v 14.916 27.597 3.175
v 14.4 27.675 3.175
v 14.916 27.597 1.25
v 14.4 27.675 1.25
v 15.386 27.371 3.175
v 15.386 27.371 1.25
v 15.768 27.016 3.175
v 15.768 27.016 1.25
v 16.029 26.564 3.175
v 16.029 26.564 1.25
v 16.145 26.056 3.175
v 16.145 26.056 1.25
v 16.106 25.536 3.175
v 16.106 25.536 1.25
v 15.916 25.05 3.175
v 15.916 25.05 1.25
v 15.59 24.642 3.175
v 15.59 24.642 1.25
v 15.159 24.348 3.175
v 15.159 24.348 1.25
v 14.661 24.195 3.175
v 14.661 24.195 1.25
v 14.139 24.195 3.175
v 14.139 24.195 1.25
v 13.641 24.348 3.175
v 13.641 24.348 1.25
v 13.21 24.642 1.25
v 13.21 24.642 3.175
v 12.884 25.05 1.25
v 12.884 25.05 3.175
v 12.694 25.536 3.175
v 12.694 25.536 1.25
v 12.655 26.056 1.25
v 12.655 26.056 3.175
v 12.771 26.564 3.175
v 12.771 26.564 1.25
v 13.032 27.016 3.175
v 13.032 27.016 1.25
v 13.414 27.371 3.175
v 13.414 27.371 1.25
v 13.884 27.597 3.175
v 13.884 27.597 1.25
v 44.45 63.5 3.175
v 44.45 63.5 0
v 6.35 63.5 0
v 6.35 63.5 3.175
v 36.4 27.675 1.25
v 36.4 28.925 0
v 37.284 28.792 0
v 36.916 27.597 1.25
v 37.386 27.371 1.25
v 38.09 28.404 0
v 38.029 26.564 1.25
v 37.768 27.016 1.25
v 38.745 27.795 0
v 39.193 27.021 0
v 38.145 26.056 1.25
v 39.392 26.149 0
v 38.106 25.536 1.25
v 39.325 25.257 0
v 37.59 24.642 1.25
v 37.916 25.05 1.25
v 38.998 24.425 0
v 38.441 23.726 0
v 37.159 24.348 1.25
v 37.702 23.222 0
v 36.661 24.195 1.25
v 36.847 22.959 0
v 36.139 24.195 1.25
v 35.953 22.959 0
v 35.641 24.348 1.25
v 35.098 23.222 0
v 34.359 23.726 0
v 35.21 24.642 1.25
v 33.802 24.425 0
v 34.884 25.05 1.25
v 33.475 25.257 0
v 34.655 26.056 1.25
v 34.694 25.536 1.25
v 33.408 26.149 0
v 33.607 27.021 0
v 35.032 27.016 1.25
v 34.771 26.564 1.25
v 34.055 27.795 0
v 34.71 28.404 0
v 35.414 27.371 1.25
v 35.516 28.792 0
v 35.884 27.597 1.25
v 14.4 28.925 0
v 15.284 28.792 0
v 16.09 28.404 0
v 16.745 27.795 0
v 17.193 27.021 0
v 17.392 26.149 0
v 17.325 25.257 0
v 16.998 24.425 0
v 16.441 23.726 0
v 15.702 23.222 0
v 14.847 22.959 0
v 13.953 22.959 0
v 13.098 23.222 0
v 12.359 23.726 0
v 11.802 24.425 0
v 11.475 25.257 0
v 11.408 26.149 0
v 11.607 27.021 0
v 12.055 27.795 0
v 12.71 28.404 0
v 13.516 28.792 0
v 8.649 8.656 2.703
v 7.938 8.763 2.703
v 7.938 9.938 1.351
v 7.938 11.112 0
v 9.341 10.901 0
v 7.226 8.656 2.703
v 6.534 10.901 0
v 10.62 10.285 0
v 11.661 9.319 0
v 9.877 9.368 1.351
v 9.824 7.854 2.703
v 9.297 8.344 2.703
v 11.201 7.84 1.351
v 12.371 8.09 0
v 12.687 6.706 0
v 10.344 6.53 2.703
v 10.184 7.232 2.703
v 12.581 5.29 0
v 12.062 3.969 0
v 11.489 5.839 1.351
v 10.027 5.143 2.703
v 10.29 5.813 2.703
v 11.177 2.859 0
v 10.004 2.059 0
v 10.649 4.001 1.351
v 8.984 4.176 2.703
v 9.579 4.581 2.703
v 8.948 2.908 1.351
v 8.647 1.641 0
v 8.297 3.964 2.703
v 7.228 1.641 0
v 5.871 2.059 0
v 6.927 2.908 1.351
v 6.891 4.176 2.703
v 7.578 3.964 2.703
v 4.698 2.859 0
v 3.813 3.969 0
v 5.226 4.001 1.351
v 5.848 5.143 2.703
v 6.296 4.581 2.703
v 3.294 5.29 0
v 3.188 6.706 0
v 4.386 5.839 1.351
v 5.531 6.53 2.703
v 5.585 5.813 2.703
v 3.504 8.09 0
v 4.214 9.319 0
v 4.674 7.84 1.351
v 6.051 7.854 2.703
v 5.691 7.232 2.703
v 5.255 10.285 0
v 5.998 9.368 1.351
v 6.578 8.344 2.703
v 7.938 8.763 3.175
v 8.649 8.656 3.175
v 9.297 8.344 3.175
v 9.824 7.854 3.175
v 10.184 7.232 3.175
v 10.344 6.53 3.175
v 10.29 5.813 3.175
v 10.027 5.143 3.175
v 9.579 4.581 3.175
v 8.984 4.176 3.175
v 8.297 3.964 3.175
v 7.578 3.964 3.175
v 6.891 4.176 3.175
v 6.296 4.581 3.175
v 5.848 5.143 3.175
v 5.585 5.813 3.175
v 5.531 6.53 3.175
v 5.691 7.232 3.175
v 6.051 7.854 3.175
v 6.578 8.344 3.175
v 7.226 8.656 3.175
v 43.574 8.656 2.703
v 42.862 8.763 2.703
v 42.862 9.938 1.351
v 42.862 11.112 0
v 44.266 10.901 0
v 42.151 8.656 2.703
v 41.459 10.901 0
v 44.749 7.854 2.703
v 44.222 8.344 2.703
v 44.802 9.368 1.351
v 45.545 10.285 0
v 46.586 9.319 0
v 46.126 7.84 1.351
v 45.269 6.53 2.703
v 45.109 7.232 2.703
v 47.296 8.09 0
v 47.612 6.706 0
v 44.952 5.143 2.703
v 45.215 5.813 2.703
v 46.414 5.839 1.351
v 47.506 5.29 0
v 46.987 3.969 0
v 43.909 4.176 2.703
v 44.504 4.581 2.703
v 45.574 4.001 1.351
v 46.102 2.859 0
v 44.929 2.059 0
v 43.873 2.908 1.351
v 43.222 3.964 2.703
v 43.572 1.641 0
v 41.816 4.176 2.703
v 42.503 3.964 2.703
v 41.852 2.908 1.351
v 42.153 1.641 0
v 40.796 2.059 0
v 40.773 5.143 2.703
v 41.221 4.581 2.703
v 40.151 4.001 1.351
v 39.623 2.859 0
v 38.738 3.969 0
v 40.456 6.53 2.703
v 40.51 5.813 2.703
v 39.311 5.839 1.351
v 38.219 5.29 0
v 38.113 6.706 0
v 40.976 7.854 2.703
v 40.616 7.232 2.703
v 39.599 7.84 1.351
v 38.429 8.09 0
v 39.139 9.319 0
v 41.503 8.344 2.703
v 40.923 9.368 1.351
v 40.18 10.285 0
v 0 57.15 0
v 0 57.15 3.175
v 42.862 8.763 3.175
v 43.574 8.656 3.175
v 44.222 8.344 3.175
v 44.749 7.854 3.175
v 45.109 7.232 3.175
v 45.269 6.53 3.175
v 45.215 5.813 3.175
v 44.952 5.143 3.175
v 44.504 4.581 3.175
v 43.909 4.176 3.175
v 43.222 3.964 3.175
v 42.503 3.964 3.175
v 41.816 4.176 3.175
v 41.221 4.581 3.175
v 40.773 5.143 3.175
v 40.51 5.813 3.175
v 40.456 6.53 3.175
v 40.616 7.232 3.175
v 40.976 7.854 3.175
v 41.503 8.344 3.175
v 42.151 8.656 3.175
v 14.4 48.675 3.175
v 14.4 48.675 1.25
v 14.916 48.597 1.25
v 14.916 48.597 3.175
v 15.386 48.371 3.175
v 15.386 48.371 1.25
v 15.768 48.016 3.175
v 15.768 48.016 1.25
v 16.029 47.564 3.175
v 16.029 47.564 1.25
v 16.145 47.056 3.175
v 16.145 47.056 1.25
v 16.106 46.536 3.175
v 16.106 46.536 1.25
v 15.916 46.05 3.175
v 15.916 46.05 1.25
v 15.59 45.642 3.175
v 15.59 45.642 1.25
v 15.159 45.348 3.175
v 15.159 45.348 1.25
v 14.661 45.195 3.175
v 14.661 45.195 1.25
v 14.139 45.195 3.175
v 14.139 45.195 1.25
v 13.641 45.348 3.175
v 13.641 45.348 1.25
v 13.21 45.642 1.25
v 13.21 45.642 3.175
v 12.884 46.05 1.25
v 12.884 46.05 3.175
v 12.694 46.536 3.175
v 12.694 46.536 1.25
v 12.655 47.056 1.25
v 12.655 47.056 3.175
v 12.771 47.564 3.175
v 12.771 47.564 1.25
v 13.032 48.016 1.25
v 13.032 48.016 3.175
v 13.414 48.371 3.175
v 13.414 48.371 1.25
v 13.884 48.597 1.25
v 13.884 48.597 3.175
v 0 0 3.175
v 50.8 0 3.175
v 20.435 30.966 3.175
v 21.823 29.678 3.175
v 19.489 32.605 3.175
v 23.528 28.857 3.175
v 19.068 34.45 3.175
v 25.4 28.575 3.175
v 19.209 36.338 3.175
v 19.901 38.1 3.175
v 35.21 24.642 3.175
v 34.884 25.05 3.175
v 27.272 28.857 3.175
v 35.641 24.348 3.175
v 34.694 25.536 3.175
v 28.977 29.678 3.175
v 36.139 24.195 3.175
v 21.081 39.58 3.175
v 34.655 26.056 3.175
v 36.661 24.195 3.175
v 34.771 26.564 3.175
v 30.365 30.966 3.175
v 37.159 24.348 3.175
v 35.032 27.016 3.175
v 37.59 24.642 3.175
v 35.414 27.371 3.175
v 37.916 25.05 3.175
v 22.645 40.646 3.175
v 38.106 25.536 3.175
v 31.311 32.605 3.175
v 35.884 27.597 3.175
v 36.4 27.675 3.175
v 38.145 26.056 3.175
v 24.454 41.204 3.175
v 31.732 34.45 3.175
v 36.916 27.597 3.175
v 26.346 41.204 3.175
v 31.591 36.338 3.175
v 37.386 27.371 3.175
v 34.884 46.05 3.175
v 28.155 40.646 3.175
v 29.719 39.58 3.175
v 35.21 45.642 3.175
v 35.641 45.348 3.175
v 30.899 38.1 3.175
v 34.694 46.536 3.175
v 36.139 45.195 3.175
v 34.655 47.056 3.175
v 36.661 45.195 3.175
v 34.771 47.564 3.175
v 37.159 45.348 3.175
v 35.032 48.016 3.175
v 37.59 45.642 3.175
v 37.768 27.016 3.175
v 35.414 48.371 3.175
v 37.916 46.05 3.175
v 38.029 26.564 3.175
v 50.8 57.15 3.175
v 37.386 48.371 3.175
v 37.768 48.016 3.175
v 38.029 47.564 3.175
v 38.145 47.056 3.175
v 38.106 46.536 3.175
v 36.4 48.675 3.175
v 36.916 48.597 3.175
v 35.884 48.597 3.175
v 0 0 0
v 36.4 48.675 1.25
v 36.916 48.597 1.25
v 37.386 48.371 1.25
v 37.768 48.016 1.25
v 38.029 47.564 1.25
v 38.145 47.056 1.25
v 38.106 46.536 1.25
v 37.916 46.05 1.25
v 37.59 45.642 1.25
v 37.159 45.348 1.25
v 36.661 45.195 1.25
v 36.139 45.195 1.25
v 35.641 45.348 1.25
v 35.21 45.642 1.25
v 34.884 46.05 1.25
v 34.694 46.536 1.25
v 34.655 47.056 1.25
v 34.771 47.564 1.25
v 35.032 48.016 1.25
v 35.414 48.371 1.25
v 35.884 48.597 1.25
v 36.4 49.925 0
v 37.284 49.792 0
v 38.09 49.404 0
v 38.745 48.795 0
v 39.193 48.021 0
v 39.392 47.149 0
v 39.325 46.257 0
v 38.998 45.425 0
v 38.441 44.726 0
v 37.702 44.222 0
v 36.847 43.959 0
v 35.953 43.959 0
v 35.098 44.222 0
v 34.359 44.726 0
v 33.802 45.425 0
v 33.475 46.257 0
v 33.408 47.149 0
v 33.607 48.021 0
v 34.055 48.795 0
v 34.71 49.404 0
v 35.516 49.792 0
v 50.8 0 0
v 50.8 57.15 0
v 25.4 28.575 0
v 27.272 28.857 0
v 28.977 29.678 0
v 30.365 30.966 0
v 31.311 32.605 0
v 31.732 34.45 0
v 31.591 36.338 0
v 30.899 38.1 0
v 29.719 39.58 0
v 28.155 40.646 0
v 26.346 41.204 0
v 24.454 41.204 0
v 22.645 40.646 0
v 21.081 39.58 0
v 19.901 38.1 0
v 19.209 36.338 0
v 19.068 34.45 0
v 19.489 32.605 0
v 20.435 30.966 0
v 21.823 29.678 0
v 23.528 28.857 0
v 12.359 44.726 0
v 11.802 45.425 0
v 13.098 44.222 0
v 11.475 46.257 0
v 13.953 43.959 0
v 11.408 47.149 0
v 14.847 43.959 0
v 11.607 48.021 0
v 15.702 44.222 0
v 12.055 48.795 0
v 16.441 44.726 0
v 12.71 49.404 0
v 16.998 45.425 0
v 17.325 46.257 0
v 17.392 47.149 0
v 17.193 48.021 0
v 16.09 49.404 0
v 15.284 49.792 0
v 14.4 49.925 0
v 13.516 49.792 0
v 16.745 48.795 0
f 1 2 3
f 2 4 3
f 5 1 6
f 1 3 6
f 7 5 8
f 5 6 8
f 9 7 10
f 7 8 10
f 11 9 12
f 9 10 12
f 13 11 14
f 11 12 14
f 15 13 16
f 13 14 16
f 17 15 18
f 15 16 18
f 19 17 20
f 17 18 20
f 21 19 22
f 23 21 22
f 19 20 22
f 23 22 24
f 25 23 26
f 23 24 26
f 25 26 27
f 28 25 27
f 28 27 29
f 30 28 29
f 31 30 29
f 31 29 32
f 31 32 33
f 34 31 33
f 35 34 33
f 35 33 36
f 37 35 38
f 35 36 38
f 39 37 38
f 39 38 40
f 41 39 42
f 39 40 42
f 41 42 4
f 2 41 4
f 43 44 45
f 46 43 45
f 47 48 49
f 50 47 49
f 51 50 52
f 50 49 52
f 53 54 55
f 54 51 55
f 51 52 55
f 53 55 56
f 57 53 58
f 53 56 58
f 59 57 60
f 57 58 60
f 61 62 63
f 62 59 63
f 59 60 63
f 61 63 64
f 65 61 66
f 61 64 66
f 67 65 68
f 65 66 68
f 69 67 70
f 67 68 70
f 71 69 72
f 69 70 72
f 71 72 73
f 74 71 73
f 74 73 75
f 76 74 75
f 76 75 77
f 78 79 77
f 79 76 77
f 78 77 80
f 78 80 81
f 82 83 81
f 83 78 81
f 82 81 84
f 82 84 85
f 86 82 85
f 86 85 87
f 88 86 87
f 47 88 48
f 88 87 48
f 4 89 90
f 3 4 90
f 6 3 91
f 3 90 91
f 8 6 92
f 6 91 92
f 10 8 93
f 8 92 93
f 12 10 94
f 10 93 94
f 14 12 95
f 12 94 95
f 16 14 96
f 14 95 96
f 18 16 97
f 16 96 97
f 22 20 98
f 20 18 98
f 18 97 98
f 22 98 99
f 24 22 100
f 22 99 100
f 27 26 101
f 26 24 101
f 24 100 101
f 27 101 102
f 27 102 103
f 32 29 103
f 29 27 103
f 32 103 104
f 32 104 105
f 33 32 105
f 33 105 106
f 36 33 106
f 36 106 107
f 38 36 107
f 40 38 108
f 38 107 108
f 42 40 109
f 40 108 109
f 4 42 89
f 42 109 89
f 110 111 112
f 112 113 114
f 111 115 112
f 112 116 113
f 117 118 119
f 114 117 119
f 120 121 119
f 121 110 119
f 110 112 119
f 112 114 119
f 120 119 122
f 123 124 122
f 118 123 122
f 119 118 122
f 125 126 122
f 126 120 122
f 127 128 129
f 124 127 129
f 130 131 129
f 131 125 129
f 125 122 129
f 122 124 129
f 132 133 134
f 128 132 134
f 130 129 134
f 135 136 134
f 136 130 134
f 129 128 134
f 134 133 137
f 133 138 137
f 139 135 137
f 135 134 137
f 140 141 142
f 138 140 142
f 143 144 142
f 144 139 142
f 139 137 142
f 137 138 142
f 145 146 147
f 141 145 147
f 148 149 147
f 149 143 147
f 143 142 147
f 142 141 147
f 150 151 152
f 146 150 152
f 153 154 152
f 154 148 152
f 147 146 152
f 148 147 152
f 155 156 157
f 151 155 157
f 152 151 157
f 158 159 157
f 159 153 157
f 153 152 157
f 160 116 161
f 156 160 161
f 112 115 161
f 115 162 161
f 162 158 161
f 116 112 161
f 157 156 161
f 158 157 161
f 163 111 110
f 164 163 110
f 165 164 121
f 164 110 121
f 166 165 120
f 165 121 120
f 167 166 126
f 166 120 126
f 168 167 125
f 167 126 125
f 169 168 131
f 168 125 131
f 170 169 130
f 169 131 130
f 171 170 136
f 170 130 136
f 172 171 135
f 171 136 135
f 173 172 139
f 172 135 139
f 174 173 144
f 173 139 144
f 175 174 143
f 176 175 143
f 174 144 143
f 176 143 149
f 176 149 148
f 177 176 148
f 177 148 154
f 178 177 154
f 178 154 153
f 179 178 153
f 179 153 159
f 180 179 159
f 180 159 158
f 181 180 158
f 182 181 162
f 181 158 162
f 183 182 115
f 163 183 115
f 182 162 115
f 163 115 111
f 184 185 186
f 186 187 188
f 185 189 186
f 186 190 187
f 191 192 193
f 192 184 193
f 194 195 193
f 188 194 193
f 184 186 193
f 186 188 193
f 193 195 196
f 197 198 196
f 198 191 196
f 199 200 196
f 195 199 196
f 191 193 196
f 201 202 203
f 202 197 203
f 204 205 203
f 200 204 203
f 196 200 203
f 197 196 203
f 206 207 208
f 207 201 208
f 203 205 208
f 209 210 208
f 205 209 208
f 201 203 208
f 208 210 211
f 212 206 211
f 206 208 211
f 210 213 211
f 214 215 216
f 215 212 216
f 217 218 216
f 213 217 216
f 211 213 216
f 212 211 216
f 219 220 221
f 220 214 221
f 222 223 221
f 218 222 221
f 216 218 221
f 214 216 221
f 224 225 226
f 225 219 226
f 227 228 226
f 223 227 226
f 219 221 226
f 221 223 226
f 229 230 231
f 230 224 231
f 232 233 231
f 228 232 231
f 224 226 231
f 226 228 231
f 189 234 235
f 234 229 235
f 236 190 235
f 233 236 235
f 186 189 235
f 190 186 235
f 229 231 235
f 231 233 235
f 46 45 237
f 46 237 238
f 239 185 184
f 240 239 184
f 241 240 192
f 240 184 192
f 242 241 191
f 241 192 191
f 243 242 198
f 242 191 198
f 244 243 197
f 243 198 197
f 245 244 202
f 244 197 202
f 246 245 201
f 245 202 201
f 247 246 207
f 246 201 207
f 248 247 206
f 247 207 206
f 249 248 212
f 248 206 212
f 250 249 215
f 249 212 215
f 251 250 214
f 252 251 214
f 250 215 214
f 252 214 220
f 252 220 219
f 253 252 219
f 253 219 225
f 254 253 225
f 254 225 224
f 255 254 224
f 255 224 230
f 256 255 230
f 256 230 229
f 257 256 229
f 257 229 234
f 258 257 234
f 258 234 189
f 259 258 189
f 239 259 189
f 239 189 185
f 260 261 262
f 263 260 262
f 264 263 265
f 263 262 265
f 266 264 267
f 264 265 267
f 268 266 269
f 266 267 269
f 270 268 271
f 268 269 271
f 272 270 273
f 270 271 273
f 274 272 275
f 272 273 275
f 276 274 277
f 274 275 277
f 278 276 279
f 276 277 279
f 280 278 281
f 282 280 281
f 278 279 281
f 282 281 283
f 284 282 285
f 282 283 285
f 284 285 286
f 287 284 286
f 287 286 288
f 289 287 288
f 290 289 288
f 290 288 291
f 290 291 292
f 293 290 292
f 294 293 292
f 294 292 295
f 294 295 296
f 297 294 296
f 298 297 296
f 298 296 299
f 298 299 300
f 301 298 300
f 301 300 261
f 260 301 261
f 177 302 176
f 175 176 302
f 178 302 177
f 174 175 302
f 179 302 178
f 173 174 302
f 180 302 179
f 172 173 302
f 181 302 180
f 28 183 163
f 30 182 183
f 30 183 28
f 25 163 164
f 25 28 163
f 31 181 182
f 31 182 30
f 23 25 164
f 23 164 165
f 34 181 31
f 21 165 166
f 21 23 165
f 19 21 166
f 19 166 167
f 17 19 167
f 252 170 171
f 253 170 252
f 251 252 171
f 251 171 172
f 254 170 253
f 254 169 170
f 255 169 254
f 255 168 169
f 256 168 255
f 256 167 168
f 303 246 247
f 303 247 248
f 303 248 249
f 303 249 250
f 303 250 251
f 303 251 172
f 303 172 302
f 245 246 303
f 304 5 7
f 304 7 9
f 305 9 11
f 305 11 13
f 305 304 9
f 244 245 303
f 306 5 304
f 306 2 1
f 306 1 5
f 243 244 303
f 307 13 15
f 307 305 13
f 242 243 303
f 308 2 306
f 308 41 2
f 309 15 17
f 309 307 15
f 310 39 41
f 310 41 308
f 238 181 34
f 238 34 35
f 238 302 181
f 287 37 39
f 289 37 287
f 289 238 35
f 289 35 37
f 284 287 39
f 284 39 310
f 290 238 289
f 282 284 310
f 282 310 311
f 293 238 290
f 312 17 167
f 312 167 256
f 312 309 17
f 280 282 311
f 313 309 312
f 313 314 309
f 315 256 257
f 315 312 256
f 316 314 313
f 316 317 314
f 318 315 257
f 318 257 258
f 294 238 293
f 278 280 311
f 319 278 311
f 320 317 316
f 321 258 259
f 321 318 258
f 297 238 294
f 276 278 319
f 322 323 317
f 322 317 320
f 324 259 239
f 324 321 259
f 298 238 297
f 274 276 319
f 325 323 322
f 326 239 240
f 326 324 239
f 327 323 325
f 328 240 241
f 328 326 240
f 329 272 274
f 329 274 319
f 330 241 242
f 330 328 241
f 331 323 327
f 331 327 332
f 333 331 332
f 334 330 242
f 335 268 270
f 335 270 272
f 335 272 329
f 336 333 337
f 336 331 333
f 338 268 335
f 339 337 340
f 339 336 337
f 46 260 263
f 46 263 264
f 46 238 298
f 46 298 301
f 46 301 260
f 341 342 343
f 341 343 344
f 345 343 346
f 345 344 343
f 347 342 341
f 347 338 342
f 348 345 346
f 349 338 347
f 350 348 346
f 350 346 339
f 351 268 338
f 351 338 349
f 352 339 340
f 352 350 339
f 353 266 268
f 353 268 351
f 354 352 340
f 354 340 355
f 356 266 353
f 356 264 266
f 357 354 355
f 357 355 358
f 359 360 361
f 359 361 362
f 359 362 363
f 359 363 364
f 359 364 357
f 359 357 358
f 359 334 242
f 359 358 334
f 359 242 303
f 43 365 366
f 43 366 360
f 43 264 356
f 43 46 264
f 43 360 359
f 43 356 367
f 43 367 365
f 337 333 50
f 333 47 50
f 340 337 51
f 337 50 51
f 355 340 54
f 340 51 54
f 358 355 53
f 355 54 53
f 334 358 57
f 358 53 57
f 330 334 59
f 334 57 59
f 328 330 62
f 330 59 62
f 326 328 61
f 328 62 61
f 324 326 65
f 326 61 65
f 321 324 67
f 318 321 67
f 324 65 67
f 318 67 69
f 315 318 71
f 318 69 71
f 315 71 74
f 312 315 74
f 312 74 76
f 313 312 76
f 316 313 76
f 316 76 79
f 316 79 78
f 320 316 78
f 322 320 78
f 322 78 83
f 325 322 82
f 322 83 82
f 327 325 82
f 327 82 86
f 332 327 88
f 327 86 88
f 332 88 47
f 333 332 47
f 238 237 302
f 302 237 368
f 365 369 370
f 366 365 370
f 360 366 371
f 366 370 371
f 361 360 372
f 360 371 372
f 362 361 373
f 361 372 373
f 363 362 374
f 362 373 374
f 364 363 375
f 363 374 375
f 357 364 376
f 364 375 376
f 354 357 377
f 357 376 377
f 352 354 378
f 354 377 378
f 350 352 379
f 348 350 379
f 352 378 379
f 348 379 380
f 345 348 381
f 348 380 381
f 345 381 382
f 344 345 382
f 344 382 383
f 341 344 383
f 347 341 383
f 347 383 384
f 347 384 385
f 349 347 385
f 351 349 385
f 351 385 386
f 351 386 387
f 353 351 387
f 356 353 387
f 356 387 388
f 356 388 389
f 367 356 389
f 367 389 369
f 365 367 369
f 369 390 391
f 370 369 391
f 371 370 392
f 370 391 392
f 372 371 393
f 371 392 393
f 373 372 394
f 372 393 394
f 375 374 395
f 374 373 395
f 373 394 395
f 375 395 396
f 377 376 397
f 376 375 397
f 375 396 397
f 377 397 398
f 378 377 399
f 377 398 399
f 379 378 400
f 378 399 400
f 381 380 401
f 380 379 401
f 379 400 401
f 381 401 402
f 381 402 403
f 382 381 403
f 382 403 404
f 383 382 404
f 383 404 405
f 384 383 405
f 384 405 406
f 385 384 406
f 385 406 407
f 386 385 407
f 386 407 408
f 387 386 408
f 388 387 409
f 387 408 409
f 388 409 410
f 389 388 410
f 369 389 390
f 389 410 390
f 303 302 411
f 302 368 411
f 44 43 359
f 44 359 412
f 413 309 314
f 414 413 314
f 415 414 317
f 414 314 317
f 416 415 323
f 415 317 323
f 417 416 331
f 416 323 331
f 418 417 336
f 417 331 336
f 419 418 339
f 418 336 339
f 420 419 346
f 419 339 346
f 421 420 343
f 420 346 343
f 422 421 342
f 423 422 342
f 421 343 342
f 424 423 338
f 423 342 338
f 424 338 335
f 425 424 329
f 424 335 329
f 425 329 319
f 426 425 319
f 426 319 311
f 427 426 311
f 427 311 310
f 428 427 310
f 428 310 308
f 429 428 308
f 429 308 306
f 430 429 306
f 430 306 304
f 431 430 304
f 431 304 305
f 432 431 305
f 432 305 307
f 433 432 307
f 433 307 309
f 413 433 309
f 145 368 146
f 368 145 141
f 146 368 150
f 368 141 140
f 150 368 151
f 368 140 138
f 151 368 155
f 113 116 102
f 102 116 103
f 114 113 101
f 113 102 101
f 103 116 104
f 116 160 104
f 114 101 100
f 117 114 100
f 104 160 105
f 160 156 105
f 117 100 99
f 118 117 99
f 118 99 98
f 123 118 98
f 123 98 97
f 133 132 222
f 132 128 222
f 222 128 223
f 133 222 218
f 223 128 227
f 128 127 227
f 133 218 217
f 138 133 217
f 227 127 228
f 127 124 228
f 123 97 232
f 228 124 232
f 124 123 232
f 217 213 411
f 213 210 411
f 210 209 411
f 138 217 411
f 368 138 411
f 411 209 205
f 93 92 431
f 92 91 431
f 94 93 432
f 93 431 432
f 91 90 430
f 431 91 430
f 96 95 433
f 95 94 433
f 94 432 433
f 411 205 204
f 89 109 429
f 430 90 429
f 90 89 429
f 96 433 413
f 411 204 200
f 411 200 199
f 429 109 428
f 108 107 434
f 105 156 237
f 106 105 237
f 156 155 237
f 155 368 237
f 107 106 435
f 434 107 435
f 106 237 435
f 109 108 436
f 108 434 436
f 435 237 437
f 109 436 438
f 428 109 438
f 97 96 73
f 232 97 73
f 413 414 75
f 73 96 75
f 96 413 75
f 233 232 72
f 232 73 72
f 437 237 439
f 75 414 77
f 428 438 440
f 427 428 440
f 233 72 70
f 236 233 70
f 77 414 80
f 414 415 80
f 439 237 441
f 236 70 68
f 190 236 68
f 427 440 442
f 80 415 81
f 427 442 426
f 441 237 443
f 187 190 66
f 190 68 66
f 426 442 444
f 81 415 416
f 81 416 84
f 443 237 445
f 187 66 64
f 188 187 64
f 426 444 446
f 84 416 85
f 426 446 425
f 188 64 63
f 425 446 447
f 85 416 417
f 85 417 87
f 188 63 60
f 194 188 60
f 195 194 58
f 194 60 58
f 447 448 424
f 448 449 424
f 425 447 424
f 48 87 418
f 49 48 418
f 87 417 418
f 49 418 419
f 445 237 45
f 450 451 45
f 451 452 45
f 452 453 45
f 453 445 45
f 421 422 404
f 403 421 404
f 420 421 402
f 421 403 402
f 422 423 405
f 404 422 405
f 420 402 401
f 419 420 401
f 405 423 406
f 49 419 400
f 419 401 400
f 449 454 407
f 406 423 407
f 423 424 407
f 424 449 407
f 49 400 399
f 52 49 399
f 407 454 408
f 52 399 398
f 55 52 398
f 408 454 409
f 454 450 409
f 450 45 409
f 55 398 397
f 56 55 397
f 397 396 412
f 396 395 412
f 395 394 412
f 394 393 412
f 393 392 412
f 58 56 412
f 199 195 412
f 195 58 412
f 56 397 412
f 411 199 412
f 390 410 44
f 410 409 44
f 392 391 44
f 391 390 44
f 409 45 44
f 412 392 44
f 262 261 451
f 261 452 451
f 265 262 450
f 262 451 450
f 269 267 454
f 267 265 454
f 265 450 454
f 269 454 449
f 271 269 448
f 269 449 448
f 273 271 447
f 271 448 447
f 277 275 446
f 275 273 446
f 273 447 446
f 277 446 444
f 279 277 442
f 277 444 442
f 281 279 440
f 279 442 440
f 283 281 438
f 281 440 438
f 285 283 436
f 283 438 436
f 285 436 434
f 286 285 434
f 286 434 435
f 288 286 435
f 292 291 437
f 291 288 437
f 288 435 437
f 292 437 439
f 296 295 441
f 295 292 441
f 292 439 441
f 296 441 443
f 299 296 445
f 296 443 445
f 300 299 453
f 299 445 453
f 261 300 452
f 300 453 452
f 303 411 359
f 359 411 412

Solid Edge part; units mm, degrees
sketch "Sketch1" plane through (0, 0, 0) normal (0, 0, 1) x (1, 0, 0)
  line L0 (0, 0) -> (50.8, 0)
  line L1 (50.8, 0) -> (50.8, 63.5)
  line L2 (50.8, 63.5) -> (0, 63.5)
  line L3 (0, 63.5) -> (0, 0)
  dimension "D1" = 50.8
  dimension "D2" = 63.5
extrude "Protrusion1" add sketch "Sketch1" along normal blind 3.175
hole "Hole_1" at (7.9375, 6.35, 0) direction (0, 0, 1) diameter 4.826 end up to next countersink diameter 9.525 countersink angle 82
hole "Hole1" at (42.8625, 6.35, 0) direction (0, 0, 1) diameter 4.826 end up to next countersink diameter 9.525 countersink angle 82
hole "Hole_2" at (25.4, 34.925, 3.175) direction (0, 0, -1) diameter 12.7 end up to next
chamfer "Chamfer_1" distance 6.35 angle 45 2 edges at (0, 63.5, 1.5875) (50.8, 63.5, 1.5875)
hole "Hole_4" at (14.4, 46.925, 0) direction (0, 0, 1) diameter 3.5 end up to next countersink diameter 6 countersink angle 90
hole "Hole2" at (14.4, 25.925, 0) direction (0, 0, 1) diameter 3.5 end up to next countersink diameter 6 countersink angle 90
hole "Hole3" at (36.4, 25.925, 0) direction (0, 0, 1) diameter 3.5 end up to next countersink diameter 6 countersink angle 90
hole "Hole4" at (36.4, 46.925, 0) direction (0, 0, 1) diameter 3.5 end up to next countersink diameter 6 countersink angle 90
properties part number "CHAS-04" material "Aluminum, 1060"
